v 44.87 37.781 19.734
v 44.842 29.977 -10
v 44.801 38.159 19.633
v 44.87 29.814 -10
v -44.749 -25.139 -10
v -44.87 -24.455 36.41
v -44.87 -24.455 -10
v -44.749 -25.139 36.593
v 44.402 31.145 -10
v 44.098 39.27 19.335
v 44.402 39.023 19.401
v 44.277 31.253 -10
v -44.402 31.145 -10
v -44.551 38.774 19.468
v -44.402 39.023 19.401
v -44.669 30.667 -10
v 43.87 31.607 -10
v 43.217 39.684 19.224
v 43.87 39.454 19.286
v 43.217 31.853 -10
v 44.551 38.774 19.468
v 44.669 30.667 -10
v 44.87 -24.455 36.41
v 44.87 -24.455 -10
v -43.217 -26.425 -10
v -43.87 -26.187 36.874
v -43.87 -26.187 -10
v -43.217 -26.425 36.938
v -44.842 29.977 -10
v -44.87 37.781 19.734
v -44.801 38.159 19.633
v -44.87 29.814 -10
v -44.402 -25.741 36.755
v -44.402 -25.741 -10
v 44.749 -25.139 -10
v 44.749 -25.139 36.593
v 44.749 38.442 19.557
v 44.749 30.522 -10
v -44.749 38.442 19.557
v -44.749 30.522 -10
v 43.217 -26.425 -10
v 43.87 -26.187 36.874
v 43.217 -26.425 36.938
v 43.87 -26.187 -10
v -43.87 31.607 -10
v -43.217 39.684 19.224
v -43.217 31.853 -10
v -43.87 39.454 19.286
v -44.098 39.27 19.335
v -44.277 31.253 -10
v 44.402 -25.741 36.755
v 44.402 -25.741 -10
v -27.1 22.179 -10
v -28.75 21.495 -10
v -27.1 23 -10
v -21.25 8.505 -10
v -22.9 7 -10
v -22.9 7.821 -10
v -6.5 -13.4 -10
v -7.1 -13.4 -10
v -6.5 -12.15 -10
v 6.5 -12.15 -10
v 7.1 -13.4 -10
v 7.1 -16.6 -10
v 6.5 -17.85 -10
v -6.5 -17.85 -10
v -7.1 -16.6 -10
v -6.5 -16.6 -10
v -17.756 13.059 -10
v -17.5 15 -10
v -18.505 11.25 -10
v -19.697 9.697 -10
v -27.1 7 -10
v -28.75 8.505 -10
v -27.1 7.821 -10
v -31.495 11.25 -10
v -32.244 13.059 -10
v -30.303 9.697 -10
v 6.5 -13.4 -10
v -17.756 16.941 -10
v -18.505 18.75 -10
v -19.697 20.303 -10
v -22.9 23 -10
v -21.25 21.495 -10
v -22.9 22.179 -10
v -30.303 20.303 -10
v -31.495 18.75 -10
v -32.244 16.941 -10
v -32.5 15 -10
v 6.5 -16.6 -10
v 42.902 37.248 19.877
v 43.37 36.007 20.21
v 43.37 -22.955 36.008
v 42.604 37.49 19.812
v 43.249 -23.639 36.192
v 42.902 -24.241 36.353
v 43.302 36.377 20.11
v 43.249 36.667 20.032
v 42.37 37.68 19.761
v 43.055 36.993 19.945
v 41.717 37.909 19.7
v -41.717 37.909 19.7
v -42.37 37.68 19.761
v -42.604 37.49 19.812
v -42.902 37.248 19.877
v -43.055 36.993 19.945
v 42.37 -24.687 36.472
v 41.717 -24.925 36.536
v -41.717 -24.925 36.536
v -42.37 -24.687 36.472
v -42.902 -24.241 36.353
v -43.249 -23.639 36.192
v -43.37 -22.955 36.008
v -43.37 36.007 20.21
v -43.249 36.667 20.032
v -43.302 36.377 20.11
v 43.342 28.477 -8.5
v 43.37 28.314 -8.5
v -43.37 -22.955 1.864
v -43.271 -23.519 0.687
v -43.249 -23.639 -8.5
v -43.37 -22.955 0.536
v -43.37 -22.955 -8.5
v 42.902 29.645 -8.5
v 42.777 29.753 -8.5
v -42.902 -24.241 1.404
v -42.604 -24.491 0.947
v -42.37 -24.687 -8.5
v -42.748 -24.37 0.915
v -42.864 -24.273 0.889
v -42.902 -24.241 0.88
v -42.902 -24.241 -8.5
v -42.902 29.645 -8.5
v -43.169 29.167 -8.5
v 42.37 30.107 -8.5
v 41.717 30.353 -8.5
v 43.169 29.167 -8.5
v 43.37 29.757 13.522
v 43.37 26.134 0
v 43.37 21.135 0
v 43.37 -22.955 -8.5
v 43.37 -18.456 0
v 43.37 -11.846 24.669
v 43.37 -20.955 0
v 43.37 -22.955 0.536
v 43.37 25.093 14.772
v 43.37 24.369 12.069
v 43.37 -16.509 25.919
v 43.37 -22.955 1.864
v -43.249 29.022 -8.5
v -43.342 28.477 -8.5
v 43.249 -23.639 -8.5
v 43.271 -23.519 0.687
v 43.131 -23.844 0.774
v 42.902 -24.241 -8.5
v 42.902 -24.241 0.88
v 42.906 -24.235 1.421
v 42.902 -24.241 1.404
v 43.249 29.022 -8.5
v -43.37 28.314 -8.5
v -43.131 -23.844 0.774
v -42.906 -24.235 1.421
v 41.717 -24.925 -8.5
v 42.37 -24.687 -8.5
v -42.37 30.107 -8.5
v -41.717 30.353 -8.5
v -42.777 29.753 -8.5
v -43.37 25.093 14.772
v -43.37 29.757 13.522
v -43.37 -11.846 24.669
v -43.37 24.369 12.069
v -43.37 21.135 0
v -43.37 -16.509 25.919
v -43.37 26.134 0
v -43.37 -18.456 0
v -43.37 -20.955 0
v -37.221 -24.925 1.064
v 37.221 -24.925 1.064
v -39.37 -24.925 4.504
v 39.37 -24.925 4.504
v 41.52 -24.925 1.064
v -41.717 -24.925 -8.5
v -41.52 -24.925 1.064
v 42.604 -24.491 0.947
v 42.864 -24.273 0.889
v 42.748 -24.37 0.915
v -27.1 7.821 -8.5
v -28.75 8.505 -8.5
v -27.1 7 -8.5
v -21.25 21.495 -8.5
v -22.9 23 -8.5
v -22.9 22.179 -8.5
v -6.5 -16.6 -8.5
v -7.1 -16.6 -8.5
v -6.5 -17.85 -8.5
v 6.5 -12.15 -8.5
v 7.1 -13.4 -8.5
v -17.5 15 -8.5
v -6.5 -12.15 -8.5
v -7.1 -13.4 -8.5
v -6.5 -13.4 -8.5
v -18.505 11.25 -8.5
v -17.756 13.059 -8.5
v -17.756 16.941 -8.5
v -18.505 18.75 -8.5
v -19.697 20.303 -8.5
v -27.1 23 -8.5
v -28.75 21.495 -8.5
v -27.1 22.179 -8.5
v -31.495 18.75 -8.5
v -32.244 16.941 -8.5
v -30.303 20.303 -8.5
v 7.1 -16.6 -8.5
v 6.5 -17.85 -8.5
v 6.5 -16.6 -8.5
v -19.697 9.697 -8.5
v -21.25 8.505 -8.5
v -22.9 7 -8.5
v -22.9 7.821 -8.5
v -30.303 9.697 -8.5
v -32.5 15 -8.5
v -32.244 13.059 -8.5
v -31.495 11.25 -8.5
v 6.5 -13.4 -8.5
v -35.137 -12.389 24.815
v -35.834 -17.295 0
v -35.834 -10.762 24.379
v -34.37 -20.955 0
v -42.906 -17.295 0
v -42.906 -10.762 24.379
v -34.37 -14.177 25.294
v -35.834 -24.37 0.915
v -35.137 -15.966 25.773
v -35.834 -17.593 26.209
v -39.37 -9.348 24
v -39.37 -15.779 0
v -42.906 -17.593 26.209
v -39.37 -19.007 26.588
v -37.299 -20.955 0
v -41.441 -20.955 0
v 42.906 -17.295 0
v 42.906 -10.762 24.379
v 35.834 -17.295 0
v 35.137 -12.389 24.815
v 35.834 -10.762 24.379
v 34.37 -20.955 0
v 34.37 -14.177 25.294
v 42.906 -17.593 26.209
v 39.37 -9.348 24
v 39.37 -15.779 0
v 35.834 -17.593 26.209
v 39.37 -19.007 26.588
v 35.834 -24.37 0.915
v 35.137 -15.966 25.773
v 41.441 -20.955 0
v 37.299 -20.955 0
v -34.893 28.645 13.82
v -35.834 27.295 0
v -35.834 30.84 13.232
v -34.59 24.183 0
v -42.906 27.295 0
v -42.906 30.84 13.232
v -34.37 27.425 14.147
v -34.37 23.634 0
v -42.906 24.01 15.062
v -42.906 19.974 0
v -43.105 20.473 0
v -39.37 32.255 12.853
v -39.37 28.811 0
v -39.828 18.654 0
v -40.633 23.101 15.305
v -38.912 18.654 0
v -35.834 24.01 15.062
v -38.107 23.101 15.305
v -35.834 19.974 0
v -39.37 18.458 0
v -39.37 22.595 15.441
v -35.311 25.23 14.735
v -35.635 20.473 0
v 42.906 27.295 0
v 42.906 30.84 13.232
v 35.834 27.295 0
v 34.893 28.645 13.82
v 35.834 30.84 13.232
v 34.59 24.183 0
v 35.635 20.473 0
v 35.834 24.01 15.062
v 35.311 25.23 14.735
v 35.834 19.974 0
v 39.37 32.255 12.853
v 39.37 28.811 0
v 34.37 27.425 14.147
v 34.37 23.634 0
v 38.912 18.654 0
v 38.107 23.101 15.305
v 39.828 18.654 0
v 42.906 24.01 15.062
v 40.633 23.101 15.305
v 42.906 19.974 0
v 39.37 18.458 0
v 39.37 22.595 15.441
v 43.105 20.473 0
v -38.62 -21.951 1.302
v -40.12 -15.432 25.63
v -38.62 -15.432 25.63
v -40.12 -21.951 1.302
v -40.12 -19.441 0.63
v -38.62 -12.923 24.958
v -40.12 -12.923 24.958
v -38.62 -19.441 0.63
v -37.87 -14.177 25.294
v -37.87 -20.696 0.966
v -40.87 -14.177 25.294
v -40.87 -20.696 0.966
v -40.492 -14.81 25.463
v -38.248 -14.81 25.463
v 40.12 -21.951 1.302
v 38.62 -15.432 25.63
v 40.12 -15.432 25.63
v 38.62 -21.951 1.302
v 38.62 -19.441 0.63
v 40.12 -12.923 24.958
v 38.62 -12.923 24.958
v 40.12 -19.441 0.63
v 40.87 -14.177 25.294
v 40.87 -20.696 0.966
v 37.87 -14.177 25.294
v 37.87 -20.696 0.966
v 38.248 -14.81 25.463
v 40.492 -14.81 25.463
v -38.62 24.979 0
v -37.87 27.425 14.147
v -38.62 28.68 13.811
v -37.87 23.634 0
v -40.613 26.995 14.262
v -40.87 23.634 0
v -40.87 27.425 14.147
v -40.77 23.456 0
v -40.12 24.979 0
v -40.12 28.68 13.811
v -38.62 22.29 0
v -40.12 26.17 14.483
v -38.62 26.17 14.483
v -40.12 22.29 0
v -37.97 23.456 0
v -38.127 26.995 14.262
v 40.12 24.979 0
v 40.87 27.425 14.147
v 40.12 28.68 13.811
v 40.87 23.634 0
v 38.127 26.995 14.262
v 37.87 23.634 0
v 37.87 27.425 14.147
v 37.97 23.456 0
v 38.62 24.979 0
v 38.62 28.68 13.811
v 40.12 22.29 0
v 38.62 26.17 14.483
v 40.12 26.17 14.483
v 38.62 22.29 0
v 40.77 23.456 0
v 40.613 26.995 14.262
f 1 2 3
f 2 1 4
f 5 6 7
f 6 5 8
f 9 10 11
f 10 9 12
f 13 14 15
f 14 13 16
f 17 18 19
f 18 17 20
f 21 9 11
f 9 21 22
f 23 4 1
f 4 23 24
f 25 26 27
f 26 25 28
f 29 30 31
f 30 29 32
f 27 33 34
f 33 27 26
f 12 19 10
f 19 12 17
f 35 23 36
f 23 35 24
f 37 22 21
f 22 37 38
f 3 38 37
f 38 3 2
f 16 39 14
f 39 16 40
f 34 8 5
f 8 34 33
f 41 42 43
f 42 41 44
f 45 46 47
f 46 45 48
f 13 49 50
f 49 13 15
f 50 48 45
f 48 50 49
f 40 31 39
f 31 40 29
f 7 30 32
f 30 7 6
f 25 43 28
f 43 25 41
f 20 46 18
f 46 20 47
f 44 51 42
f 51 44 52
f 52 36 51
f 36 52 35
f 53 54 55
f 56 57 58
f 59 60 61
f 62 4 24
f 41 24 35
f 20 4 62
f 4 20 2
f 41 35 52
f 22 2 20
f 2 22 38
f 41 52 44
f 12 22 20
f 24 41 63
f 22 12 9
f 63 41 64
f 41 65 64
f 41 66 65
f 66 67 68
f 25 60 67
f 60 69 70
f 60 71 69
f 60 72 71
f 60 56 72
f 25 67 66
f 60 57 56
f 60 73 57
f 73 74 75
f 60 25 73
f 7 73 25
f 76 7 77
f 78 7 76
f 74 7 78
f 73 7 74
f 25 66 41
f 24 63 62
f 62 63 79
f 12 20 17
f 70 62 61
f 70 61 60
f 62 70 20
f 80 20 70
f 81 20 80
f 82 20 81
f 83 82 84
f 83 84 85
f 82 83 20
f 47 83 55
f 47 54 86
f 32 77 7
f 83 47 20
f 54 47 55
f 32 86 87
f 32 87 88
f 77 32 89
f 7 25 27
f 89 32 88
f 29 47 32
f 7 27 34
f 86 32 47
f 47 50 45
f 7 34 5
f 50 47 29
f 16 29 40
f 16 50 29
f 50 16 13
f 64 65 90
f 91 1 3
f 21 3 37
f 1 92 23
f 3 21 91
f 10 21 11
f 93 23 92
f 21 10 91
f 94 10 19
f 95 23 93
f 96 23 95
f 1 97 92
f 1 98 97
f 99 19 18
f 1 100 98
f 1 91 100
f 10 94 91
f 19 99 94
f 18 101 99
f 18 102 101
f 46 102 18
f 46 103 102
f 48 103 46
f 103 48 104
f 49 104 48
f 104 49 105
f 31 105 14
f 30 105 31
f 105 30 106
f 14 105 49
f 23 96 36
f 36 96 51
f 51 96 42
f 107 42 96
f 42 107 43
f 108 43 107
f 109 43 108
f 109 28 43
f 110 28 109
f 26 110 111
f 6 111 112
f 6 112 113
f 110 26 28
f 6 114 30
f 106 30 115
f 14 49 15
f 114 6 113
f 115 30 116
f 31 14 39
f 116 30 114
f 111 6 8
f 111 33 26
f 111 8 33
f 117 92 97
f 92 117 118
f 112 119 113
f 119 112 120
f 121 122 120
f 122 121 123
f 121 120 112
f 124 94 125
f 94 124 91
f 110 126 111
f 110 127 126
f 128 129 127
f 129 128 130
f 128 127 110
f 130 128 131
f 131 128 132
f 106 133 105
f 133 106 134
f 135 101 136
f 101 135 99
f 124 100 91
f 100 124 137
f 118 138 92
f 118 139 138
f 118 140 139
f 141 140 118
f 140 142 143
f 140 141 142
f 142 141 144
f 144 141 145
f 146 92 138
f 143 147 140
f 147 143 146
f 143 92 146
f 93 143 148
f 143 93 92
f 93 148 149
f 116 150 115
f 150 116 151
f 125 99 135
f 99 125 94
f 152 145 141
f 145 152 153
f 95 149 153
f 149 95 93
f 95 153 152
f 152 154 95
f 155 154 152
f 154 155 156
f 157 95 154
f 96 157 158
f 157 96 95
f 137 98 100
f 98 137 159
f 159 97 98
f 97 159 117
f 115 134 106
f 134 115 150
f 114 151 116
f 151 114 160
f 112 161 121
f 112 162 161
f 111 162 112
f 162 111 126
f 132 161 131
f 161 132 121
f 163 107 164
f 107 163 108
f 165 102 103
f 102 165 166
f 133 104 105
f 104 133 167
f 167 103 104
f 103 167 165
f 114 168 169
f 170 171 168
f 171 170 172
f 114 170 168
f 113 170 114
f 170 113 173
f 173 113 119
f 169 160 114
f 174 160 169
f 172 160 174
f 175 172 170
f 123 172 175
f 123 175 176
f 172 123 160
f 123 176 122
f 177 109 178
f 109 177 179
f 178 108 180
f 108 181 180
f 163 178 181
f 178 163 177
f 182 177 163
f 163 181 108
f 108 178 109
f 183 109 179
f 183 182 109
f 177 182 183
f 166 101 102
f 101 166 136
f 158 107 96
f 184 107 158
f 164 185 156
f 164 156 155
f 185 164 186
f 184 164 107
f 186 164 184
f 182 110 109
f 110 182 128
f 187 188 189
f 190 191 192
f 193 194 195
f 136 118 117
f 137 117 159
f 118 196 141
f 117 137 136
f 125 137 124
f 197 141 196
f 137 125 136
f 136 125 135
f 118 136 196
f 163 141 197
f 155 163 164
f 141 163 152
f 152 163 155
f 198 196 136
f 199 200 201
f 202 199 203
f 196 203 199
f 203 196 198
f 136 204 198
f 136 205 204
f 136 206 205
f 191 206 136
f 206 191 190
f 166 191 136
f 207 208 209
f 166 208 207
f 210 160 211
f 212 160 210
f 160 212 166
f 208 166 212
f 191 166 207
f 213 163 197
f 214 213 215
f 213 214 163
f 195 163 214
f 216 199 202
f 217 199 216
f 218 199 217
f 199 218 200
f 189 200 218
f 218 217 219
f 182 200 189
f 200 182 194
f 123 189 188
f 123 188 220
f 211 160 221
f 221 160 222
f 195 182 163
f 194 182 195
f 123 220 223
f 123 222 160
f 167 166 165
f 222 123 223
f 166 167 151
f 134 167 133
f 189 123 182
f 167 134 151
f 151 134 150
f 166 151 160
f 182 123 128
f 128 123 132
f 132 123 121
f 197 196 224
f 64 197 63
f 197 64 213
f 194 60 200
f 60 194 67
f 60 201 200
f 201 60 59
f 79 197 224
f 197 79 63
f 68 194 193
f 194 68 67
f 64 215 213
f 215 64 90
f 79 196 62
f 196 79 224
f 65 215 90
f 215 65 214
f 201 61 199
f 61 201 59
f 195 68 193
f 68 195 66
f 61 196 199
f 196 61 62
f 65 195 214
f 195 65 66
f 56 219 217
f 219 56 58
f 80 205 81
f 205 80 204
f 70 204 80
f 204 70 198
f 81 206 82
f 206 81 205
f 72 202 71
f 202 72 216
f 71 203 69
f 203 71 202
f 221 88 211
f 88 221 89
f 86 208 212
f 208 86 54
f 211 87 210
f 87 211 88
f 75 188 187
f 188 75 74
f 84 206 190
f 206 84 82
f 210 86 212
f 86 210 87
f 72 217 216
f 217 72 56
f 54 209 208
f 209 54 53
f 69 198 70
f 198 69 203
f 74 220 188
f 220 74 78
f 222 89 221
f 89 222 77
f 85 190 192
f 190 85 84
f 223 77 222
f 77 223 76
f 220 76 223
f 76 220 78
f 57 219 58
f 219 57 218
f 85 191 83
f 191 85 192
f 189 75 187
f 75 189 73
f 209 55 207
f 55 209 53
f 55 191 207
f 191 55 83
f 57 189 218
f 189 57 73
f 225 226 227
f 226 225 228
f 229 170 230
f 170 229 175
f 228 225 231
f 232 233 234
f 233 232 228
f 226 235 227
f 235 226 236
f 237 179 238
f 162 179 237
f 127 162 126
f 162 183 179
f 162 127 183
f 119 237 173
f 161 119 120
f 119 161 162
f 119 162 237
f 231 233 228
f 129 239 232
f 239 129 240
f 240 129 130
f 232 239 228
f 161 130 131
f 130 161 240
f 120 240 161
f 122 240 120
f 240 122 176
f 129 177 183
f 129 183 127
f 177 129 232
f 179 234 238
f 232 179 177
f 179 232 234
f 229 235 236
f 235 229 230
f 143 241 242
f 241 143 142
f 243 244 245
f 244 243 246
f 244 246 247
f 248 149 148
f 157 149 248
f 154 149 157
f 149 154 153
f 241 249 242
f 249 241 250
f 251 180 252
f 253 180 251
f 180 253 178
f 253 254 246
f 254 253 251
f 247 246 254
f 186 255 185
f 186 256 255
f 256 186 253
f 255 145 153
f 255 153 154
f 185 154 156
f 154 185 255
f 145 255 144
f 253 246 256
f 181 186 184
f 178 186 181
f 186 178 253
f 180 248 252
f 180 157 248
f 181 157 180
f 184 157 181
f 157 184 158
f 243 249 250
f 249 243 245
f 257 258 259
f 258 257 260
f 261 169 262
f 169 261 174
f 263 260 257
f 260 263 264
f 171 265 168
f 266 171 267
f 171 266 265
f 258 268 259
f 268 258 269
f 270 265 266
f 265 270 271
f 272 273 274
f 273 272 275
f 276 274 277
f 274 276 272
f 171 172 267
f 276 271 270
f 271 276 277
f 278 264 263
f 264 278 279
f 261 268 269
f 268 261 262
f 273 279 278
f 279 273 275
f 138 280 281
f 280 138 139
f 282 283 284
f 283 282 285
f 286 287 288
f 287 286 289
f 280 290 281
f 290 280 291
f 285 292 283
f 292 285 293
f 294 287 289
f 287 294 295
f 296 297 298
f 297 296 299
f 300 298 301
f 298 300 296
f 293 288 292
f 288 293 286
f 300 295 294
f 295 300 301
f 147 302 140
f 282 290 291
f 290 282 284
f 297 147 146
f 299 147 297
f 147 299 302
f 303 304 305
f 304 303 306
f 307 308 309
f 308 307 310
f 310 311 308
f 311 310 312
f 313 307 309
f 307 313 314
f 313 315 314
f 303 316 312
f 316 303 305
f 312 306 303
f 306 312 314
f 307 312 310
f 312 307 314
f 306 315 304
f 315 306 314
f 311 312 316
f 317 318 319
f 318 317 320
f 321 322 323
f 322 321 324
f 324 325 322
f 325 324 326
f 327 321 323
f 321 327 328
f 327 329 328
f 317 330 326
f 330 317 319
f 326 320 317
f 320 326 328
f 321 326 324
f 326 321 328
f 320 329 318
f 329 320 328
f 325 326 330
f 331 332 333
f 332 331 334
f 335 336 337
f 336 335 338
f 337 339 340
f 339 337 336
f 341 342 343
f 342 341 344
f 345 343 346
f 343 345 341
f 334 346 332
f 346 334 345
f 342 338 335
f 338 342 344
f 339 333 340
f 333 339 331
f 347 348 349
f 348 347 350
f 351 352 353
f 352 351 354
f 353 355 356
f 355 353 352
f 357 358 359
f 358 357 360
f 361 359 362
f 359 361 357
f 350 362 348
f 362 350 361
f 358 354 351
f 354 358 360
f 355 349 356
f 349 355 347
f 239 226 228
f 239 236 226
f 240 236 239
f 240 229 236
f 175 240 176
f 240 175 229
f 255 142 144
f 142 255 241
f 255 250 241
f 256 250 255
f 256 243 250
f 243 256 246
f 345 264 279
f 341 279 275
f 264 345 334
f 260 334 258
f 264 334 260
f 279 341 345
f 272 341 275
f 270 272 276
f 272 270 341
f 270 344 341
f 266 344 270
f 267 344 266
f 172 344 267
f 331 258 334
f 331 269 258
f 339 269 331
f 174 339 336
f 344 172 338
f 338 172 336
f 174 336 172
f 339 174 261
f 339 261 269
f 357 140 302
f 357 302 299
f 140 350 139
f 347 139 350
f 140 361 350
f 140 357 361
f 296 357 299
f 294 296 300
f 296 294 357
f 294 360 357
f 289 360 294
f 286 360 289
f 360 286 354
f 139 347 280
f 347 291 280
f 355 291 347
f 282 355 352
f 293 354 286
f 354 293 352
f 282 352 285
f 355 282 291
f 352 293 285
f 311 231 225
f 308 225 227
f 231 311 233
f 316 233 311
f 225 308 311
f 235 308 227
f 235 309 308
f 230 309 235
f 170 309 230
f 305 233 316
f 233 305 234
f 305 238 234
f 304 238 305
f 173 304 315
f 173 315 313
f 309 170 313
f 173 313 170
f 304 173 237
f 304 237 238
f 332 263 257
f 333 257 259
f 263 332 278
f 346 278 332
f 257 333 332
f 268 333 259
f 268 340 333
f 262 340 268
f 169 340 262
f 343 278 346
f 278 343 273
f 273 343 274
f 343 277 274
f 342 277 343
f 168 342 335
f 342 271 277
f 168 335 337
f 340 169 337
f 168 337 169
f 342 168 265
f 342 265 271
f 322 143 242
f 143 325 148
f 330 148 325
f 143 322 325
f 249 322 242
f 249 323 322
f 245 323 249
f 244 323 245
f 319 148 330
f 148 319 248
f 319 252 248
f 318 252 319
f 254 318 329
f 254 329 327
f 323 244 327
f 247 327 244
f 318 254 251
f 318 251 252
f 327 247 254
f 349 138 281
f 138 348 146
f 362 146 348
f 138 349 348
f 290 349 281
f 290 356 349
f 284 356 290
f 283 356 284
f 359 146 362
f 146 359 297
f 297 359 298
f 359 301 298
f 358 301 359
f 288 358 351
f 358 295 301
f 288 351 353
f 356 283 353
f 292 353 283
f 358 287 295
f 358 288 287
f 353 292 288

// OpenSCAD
a=15;

hw=78.74;
hh=41.91;

w=hw+4; // 100;
h=hh+4; // 60;

union() {
    difference() {
        abox(w+3, h+3);
        translate([0,0,1.5]) abox(w, h);
        
        translate([0,-15,0]) cb(14.2, 3.2);
        translate([0,-15,0]) cb(13, 5.7);
        
        translate([-25,15,-20]) cylinder(30, 15/2, 15/2);
        translate([-25-2.1,15-(16/2),-20]) cube([4.2,16,30]);
        
        // #translate([0,-30,30]) cube([20,50,20], center=true);
    }
    apillas(hw, hh);
}

module abox(w, h, r=2){
    translate([-w/2, -h/2, 0]) difference() {
        hull() {
            translate([0, 0, -20]) cylinder(70, r, r, $fn=18);
            translate([w, 0, -20]) cylinder(70, r, r, $fn=18);
            translate([0, h, -30]) rotate([-a,0,0])cylinder(90, r, r, $fn=18);
            translate([w, h, -30]) rotate([-a,0,0]) cylinder(90, r, r, $fn=18);
        }
        translate([-200,-200,-410]) cube(400);
        translate([-200,-200,90]) rotate([-a,0,0]) cube(400);
    }
}

module apillas(w, h, r=5){
    translate([-w/2, -h/2, 0]) difference() {
        union() {
            rotate([-a,0,0]) cylinder(50, r, r, $fn=8);
            translate([w, 0, 0]) rotate([-a,0,0]) cylinder(50, r, r, $fn=8);
            translate([0, h, -10]) rotate([-a,0,0])cylinder(70, r, r, $fn=8);
            translate([w, h, -10]) rotate([-a,0,0]) cylinder(70, r, r, $fn=8);
        }
        hr=1.5;
        rotate([-a, 0, 0]) translate([0,0,1]) cylinder(50, hr, hr, $fn=6);
        translate([w, 0, 0]) rotate([-a,0,0]) translate([0,0,1]) cylinder(50, hr, hr, $fn=6);
        translate([0, h, -10]) rotate([-a,0,0]) translate([0,0,1]) cylinder(70, hr, hr, $fn=6);
        translate([w, h, -10]) rotate([-a,0,0]) translate([0,0,1]) cylinder(70, hr, hr, $fn=6);
        translate([-200,-200,-400]) cube(400);
        translate([-200,-200,90-6.8-2.5]) rotate([-a,0,0]) cube(400);
    }
}

module cb(w, h) {
    translate([-w/2,-h/2,-20]) cube([w, h, 100]);
}
